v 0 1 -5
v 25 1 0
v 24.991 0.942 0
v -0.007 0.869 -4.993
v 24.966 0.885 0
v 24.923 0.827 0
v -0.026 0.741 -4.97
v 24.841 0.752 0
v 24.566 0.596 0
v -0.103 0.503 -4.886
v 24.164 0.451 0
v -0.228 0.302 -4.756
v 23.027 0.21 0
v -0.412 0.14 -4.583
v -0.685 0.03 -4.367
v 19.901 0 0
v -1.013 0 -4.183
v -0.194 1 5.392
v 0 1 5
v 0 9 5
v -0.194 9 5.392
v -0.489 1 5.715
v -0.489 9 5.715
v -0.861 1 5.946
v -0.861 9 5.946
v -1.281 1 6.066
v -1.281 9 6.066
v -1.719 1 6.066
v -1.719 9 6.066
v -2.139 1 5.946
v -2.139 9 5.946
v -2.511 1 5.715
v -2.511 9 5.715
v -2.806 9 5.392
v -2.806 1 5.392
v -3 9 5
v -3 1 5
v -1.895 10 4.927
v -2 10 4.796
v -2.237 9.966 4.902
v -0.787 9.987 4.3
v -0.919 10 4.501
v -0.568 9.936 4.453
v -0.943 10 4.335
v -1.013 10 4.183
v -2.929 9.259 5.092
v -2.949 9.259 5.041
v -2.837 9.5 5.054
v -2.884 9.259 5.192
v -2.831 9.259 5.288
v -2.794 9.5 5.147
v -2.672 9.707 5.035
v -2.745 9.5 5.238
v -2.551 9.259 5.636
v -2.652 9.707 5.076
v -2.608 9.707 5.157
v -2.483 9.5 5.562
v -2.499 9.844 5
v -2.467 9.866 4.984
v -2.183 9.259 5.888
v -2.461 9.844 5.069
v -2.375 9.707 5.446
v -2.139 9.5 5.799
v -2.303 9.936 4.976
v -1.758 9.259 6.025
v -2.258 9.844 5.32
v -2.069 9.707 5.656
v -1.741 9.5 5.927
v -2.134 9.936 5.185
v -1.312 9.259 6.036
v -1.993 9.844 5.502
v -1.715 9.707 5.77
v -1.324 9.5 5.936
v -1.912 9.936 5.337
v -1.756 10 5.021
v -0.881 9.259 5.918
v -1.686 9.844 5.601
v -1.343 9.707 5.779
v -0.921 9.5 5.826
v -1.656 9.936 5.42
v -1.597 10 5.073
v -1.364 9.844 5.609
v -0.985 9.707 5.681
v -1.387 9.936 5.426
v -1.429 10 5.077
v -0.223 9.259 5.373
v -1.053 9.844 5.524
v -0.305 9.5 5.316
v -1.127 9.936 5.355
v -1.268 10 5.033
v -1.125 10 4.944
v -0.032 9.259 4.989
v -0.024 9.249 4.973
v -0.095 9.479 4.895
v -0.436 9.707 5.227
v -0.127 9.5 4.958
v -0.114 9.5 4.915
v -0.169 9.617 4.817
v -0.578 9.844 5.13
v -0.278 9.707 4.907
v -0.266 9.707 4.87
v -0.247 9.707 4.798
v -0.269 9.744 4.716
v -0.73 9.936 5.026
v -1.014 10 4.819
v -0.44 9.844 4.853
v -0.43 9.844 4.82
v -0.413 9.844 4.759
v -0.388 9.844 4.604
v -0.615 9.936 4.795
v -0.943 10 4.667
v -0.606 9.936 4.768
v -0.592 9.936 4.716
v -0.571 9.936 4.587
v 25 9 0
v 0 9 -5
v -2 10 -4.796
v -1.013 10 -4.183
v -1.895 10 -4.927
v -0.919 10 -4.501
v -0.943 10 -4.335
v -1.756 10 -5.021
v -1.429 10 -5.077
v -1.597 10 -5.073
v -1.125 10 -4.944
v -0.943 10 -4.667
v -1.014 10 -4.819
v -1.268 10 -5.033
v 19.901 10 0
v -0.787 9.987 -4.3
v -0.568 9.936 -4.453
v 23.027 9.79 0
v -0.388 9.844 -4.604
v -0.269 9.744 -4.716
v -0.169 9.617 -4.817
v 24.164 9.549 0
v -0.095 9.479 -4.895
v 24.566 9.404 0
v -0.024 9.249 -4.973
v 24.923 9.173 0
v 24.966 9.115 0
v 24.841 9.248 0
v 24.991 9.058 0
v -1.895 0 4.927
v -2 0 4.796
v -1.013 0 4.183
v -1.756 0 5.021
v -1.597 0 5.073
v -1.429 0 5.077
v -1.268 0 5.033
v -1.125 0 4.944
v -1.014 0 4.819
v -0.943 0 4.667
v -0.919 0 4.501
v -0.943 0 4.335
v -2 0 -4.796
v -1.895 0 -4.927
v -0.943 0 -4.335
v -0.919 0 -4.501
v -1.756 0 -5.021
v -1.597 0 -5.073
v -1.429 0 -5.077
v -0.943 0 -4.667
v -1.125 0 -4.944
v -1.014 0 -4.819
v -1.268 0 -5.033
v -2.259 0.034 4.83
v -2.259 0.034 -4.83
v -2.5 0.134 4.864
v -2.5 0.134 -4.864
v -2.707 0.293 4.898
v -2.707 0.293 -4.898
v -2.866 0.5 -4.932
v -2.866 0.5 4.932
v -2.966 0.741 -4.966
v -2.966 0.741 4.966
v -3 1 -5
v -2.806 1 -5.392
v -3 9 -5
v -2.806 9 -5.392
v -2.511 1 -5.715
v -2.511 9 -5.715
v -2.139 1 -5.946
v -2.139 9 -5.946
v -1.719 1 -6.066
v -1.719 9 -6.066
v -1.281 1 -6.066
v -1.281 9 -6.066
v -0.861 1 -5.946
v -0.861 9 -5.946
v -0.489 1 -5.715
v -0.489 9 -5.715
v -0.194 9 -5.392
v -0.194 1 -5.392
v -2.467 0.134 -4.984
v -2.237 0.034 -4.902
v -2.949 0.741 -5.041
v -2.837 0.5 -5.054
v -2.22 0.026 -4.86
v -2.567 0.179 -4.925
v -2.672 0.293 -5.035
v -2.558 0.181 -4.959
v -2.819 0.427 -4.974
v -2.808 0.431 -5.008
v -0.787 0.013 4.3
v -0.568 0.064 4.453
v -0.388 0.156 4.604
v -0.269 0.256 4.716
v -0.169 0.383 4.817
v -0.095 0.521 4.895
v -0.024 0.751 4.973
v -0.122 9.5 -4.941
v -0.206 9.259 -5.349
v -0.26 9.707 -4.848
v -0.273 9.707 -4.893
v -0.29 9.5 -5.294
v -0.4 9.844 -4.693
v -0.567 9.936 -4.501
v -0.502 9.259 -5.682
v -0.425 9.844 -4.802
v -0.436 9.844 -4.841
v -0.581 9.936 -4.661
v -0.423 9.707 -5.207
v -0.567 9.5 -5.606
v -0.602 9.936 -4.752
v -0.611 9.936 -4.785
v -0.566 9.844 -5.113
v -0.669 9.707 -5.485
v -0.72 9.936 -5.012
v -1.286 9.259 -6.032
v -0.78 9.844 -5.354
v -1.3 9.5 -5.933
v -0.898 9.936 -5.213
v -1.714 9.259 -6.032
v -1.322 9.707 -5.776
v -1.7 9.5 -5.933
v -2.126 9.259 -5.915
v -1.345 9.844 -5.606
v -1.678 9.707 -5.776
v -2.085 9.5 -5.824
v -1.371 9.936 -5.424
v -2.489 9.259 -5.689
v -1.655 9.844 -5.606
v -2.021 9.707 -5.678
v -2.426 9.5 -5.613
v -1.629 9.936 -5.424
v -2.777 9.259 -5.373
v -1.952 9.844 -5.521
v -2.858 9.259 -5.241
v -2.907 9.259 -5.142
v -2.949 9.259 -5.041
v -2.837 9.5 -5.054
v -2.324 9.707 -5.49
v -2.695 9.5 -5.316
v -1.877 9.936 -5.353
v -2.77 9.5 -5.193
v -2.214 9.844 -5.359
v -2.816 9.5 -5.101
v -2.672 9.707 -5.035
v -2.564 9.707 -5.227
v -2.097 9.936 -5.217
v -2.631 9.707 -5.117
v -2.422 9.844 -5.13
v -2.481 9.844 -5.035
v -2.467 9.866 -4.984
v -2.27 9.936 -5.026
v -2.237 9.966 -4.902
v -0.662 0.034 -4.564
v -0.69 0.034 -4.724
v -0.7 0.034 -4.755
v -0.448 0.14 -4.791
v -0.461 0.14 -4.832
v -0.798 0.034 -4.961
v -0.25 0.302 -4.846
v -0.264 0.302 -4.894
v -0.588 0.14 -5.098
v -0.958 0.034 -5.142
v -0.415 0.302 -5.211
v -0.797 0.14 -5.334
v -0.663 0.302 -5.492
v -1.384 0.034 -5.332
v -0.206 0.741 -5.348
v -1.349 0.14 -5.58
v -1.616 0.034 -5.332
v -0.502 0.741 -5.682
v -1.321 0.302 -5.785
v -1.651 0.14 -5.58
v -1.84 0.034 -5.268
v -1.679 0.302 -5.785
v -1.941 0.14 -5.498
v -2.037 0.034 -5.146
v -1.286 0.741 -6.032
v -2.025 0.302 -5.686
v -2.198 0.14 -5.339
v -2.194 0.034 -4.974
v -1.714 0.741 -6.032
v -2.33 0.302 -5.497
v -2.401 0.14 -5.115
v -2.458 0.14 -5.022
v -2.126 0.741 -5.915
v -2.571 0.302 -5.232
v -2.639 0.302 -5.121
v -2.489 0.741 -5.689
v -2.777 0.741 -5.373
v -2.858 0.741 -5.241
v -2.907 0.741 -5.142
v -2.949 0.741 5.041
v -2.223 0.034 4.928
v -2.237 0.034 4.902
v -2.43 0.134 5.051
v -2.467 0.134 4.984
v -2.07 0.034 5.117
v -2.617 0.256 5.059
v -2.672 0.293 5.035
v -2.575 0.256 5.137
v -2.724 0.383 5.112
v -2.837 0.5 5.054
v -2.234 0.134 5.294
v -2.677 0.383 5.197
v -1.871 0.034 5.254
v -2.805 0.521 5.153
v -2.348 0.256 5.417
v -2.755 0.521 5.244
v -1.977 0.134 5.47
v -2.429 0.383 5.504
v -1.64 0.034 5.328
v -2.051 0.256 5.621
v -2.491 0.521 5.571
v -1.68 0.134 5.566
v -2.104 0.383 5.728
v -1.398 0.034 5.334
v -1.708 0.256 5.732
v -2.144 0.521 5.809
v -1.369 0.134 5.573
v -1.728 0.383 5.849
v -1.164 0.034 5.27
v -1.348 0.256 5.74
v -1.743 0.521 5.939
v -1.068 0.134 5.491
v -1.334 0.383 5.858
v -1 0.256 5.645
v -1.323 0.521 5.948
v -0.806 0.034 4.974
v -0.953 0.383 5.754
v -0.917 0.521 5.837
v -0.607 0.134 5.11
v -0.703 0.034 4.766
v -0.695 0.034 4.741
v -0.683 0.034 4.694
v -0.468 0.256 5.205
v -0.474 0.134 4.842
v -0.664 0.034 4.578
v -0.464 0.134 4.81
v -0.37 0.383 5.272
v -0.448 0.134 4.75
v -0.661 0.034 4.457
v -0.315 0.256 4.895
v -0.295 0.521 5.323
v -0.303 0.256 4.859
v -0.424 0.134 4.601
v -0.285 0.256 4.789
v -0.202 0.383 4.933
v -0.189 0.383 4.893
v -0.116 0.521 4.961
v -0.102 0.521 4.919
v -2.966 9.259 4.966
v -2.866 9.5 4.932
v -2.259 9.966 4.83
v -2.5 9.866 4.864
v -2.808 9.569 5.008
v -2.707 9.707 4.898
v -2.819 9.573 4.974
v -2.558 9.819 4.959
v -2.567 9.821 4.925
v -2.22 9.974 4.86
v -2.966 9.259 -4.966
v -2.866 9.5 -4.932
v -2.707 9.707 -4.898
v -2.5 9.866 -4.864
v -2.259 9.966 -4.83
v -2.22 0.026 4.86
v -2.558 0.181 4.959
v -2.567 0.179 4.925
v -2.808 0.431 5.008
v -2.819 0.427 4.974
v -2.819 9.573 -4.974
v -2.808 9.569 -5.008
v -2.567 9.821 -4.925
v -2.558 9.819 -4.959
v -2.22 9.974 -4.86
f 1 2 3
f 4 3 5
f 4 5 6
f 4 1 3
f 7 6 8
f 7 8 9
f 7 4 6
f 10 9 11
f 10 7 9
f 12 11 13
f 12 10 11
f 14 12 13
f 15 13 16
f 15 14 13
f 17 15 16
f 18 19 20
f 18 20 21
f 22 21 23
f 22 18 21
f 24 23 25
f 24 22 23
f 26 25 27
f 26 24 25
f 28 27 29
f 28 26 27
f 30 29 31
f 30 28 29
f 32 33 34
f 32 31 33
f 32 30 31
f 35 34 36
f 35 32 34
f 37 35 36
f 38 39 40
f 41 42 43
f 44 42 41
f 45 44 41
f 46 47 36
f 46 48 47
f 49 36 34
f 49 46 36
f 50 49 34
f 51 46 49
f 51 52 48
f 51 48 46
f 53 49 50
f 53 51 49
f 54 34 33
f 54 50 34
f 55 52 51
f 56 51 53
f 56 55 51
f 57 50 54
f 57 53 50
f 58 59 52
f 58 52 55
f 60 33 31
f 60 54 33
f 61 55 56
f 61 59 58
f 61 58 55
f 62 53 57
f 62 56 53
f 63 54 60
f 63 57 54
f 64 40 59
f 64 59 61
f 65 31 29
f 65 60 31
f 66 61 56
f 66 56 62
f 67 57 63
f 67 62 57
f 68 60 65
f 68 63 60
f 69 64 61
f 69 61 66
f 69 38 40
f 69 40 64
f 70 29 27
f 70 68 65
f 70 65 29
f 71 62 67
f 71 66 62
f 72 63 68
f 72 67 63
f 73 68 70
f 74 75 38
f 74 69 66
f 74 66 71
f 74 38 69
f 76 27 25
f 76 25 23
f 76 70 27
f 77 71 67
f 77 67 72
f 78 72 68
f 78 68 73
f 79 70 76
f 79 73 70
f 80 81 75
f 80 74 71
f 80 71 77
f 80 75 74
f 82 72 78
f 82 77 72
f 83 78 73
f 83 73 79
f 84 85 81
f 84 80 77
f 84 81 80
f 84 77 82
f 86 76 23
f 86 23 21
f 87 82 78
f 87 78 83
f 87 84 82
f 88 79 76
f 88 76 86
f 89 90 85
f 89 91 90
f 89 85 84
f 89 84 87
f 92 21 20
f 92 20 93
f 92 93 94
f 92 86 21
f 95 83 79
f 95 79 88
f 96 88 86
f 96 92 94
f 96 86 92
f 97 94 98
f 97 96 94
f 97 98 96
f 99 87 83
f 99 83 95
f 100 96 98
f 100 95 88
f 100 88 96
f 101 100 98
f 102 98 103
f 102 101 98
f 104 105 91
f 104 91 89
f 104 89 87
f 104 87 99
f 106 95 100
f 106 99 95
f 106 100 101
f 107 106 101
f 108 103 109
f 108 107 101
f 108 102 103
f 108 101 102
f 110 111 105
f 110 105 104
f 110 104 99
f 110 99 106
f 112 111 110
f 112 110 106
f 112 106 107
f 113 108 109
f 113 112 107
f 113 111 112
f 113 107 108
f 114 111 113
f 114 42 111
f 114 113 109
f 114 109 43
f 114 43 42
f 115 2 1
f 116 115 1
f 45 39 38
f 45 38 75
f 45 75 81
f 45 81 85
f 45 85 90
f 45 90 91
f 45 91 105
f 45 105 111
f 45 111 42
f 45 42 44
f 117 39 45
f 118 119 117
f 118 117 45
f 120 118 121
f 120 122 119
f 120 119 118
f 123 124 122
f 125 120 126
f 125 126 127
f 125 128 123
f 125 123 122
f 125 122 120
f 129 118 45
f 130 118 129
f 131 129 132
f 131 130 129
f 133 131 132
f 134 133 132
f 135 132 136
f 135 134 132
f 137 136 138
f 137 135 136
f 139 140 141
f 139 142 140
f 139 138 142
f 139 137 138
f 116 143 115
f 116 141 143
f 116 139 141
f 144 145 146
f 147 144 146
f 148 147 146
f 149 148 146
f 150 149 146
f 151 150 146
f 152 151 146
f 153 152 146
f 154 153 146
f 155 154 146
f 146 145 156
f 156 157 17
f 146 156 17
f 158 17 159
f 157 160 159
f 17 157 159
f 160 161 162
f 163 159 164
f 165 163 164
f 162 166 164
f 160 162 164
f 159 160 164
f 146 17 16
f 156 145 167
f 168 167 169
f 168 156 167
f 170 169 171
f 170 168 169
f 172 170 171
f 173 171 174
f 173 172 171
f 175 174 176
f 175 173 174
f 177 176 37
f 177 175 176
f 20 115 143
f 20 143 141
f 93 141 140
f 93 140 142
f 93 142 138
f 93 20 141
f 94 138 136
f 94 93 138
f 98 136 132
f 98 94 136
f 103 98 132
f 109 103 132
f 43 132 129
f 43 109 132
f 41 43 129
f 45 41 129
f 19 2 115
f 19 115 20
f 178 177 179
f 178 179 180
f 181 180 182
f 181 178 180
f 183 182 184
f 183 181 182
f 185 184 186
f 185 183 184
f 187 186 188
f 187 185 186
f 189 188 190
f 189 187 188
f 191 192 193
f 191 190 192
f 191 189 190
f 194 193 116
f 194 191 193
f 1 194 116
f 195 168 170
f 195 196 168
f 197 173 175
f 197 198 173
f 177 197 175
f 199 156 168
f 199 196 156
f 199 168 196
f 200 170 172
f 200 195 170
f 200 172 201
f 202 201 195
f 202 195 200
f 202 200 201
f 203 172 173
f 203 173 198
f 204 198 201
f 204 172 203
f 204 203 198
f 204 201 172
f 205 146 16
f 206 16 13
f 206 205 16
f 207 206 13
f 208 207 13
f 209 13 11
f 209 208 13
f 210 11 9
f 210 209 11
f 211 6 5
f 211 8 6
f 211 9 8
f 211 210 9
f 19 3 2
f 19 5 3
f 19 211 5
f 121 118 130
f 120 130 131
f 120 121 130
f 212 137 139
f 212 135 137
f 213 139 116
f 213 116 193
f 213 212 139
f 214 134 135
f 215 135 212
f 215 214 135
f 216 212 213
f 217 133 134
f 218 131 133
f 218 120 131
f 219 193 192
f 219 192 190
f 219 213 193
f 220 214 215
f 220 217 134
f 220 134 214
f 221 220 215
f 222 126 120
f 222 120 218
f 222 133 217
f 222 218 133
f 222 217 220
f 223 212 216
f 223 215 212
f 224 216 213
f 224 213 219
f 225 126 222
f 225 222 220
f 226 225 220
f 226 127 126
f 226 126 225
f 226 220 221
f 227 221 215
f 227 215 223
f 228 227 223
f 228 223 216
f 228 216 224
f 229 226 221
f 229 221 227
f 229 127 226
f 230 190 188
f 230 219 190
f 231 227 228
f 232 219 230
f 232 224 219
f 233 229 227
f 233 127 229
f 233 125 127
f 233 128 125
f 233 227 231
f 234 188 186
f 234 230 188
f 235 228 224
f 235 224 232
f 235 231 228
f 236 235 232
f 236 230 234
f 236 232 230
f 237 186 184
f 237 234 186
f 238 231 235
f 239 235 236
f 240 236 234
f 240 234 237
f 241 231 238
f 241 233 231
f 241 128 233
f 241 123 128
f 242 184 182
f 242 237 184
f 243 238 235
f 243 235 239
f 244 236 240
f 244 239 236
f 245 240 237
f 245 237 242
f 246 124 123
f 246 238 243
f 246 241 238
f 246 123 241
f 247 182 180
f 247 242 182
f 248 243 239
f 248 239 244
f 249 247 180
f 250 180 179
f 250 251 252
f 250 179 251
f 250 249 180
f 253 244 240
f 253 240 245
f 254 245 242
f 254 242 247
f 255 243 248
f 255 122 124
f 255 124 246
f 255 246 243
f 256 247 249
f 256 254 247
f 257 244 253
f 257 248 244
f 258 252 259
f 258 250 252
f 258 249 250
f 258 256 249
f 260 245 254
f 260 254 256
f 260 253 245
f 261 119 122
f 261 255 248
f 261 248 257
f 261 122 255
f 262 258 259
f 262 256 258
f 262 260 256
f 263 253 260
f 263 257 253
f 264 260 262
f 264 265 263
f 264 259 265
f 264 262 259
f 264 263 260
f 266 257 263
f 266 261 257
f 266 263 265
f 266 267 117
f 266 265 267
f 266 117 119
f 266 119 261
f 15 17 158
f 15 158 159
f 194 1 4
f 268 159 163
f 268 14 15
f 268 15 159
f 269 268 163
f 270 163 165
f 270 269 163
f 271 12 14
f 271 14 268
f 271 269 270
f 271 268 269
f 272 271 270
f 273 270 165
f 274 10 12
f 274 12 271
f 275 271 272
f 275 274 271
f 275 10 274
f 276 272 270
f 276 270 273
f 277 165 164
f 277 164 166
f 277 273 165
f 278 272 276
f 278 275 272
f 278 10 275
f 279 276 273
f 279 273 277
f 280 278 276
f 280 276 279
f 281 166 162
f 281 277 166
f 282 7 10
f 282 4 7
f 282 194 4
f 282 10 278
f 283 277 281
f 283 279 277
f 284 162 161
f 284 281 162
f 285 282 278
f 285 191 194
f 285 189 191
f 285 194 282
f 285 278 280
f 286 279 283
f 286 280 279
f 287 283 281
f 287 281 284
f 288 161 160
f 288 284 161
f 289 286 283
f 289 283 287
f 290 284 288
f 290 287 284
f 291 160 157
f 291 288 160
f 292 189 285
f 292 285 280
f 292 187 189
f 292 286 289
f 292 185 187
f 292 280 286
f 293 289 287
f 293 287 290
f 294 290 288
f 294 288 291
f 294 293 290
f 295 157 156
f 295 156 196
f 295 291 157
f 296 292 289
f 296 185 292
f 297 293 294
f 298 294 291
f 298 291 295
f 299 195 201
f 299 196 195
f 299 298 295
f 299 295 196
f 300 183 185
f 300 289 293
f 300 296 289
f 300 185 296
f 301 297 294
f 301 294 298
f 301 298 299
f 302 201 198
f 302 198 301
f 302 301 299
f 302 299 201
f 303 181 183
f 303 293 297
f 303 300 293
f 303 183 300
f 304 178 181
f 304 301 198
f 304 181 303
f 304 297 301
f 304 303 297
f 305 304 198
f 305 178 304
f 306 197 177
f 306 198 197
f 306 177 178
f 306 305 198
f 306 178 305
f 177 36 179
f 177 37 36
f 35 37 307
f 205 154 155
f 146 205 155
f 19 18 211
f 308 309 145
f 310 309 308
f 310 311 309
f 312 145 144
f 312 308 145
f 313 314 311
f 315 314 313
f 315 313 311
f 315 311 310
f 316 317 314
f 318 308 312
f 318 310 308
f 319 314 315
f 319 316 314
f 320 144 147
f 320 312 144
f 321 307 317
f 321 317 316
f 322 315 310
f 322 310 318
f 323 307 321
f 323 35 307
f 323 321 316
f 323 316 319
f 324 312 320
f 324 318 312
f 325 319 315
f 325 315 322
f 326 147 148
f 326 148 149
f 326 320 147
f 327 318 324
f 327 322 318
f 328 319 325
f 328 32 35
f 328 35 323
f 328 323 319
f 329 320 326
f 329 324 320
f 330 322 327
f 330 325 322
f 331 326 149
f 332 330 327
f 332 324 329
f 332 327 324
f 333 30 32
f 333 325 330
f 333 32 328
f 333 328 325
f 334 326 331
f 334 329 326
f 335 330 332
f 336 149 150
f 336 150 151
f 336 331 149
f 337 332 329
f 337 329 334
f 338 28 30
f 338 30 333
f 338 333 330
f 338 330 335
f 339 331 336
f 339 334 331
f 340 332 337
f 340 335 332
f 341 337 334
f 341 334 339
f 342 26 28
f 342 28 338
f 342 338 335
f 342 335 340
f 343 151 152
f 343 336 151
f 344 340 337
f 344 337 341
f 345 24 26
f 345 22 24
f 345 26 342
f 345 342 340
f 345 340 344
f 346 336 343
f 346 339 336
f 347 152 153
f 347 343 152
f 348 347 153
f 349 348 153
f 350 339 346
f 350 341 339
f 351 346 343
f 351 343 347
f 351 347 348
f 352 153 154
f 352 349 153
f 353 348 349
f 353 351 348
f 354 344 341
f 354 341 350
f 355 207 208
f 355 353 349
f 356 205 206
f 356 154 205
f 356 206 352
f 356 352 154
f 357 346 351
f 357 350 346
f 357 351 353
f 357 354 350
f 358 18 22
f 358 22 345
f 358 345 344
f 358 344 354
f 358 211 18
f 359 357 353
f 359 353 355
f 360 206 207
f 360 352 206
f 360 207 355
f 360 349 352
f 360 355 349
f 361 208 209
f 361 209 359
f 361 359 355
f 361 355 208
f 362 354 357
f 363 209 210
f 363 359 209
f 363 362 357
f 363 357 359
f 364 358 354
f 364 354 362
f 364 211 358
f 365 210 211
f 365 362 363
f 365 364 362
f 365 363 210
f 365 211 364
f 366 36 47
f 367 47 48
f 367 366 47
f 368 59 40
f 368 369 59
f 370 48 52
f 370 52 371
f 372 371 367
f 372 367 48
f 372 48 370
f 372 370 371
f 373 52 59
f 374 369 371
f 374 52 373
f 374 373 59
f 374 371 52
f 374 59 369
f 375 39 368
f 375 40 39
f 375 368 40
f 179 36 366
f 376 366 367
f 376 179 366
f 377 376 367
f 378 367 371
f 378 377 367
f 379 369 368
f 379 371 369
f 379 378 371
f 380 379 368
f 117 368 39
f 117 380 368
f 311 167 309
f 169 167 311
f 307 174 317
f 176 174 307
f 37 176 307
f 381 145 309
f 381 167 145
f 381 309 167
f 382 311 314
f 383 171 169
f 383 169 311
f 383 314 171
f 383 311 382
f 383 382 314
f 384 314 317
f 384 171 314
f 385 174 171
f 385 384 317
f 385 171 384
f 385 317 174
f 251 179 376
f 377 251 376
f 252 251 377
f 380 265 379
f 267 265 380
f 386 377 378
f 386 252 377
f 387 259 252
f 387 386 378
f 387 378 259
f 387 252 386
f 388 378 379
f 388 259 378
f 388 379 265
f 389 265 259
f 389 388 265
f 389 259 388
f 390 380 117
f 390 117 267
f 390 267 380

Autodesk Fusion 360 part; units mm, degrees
sketch "Sketch1" plane through (0, 0, 0) normal (0, 1, 0) x (1, 0, 0)
  line L0 (25, 0) -> (0, -5)
  line L1 (25, 0) -> (0, 5)
  arc A0 (-3, -5) -> (0, -5) centre (-1.5, -4.5) ccw
  arc A1 (0, 5) -> (-3, 5) centre (-1.5, 4.5) ccw
  line L2 (-3, -5) -> (-3, 5)
  dimension "d1" = 3
extrude "Extrude1" add sketch "Sketch1" along normal blind 10
fillet "Fillet1" radius 1 5 edges at (12.5, 10, 2.5) (12.5, 10, -2.5) (-1.5, 10, 6.0811) (-3, 10, 0) (-1.5, 10, -6.0811)
fillet "Fillet2" radius 1 5 edges at (12.5, 0, 2.5) (-1.5, 0, 6.0811) (-3, 0, 0) (-1.5, 0, -6.0811) (12.5, 0, -2.5)
